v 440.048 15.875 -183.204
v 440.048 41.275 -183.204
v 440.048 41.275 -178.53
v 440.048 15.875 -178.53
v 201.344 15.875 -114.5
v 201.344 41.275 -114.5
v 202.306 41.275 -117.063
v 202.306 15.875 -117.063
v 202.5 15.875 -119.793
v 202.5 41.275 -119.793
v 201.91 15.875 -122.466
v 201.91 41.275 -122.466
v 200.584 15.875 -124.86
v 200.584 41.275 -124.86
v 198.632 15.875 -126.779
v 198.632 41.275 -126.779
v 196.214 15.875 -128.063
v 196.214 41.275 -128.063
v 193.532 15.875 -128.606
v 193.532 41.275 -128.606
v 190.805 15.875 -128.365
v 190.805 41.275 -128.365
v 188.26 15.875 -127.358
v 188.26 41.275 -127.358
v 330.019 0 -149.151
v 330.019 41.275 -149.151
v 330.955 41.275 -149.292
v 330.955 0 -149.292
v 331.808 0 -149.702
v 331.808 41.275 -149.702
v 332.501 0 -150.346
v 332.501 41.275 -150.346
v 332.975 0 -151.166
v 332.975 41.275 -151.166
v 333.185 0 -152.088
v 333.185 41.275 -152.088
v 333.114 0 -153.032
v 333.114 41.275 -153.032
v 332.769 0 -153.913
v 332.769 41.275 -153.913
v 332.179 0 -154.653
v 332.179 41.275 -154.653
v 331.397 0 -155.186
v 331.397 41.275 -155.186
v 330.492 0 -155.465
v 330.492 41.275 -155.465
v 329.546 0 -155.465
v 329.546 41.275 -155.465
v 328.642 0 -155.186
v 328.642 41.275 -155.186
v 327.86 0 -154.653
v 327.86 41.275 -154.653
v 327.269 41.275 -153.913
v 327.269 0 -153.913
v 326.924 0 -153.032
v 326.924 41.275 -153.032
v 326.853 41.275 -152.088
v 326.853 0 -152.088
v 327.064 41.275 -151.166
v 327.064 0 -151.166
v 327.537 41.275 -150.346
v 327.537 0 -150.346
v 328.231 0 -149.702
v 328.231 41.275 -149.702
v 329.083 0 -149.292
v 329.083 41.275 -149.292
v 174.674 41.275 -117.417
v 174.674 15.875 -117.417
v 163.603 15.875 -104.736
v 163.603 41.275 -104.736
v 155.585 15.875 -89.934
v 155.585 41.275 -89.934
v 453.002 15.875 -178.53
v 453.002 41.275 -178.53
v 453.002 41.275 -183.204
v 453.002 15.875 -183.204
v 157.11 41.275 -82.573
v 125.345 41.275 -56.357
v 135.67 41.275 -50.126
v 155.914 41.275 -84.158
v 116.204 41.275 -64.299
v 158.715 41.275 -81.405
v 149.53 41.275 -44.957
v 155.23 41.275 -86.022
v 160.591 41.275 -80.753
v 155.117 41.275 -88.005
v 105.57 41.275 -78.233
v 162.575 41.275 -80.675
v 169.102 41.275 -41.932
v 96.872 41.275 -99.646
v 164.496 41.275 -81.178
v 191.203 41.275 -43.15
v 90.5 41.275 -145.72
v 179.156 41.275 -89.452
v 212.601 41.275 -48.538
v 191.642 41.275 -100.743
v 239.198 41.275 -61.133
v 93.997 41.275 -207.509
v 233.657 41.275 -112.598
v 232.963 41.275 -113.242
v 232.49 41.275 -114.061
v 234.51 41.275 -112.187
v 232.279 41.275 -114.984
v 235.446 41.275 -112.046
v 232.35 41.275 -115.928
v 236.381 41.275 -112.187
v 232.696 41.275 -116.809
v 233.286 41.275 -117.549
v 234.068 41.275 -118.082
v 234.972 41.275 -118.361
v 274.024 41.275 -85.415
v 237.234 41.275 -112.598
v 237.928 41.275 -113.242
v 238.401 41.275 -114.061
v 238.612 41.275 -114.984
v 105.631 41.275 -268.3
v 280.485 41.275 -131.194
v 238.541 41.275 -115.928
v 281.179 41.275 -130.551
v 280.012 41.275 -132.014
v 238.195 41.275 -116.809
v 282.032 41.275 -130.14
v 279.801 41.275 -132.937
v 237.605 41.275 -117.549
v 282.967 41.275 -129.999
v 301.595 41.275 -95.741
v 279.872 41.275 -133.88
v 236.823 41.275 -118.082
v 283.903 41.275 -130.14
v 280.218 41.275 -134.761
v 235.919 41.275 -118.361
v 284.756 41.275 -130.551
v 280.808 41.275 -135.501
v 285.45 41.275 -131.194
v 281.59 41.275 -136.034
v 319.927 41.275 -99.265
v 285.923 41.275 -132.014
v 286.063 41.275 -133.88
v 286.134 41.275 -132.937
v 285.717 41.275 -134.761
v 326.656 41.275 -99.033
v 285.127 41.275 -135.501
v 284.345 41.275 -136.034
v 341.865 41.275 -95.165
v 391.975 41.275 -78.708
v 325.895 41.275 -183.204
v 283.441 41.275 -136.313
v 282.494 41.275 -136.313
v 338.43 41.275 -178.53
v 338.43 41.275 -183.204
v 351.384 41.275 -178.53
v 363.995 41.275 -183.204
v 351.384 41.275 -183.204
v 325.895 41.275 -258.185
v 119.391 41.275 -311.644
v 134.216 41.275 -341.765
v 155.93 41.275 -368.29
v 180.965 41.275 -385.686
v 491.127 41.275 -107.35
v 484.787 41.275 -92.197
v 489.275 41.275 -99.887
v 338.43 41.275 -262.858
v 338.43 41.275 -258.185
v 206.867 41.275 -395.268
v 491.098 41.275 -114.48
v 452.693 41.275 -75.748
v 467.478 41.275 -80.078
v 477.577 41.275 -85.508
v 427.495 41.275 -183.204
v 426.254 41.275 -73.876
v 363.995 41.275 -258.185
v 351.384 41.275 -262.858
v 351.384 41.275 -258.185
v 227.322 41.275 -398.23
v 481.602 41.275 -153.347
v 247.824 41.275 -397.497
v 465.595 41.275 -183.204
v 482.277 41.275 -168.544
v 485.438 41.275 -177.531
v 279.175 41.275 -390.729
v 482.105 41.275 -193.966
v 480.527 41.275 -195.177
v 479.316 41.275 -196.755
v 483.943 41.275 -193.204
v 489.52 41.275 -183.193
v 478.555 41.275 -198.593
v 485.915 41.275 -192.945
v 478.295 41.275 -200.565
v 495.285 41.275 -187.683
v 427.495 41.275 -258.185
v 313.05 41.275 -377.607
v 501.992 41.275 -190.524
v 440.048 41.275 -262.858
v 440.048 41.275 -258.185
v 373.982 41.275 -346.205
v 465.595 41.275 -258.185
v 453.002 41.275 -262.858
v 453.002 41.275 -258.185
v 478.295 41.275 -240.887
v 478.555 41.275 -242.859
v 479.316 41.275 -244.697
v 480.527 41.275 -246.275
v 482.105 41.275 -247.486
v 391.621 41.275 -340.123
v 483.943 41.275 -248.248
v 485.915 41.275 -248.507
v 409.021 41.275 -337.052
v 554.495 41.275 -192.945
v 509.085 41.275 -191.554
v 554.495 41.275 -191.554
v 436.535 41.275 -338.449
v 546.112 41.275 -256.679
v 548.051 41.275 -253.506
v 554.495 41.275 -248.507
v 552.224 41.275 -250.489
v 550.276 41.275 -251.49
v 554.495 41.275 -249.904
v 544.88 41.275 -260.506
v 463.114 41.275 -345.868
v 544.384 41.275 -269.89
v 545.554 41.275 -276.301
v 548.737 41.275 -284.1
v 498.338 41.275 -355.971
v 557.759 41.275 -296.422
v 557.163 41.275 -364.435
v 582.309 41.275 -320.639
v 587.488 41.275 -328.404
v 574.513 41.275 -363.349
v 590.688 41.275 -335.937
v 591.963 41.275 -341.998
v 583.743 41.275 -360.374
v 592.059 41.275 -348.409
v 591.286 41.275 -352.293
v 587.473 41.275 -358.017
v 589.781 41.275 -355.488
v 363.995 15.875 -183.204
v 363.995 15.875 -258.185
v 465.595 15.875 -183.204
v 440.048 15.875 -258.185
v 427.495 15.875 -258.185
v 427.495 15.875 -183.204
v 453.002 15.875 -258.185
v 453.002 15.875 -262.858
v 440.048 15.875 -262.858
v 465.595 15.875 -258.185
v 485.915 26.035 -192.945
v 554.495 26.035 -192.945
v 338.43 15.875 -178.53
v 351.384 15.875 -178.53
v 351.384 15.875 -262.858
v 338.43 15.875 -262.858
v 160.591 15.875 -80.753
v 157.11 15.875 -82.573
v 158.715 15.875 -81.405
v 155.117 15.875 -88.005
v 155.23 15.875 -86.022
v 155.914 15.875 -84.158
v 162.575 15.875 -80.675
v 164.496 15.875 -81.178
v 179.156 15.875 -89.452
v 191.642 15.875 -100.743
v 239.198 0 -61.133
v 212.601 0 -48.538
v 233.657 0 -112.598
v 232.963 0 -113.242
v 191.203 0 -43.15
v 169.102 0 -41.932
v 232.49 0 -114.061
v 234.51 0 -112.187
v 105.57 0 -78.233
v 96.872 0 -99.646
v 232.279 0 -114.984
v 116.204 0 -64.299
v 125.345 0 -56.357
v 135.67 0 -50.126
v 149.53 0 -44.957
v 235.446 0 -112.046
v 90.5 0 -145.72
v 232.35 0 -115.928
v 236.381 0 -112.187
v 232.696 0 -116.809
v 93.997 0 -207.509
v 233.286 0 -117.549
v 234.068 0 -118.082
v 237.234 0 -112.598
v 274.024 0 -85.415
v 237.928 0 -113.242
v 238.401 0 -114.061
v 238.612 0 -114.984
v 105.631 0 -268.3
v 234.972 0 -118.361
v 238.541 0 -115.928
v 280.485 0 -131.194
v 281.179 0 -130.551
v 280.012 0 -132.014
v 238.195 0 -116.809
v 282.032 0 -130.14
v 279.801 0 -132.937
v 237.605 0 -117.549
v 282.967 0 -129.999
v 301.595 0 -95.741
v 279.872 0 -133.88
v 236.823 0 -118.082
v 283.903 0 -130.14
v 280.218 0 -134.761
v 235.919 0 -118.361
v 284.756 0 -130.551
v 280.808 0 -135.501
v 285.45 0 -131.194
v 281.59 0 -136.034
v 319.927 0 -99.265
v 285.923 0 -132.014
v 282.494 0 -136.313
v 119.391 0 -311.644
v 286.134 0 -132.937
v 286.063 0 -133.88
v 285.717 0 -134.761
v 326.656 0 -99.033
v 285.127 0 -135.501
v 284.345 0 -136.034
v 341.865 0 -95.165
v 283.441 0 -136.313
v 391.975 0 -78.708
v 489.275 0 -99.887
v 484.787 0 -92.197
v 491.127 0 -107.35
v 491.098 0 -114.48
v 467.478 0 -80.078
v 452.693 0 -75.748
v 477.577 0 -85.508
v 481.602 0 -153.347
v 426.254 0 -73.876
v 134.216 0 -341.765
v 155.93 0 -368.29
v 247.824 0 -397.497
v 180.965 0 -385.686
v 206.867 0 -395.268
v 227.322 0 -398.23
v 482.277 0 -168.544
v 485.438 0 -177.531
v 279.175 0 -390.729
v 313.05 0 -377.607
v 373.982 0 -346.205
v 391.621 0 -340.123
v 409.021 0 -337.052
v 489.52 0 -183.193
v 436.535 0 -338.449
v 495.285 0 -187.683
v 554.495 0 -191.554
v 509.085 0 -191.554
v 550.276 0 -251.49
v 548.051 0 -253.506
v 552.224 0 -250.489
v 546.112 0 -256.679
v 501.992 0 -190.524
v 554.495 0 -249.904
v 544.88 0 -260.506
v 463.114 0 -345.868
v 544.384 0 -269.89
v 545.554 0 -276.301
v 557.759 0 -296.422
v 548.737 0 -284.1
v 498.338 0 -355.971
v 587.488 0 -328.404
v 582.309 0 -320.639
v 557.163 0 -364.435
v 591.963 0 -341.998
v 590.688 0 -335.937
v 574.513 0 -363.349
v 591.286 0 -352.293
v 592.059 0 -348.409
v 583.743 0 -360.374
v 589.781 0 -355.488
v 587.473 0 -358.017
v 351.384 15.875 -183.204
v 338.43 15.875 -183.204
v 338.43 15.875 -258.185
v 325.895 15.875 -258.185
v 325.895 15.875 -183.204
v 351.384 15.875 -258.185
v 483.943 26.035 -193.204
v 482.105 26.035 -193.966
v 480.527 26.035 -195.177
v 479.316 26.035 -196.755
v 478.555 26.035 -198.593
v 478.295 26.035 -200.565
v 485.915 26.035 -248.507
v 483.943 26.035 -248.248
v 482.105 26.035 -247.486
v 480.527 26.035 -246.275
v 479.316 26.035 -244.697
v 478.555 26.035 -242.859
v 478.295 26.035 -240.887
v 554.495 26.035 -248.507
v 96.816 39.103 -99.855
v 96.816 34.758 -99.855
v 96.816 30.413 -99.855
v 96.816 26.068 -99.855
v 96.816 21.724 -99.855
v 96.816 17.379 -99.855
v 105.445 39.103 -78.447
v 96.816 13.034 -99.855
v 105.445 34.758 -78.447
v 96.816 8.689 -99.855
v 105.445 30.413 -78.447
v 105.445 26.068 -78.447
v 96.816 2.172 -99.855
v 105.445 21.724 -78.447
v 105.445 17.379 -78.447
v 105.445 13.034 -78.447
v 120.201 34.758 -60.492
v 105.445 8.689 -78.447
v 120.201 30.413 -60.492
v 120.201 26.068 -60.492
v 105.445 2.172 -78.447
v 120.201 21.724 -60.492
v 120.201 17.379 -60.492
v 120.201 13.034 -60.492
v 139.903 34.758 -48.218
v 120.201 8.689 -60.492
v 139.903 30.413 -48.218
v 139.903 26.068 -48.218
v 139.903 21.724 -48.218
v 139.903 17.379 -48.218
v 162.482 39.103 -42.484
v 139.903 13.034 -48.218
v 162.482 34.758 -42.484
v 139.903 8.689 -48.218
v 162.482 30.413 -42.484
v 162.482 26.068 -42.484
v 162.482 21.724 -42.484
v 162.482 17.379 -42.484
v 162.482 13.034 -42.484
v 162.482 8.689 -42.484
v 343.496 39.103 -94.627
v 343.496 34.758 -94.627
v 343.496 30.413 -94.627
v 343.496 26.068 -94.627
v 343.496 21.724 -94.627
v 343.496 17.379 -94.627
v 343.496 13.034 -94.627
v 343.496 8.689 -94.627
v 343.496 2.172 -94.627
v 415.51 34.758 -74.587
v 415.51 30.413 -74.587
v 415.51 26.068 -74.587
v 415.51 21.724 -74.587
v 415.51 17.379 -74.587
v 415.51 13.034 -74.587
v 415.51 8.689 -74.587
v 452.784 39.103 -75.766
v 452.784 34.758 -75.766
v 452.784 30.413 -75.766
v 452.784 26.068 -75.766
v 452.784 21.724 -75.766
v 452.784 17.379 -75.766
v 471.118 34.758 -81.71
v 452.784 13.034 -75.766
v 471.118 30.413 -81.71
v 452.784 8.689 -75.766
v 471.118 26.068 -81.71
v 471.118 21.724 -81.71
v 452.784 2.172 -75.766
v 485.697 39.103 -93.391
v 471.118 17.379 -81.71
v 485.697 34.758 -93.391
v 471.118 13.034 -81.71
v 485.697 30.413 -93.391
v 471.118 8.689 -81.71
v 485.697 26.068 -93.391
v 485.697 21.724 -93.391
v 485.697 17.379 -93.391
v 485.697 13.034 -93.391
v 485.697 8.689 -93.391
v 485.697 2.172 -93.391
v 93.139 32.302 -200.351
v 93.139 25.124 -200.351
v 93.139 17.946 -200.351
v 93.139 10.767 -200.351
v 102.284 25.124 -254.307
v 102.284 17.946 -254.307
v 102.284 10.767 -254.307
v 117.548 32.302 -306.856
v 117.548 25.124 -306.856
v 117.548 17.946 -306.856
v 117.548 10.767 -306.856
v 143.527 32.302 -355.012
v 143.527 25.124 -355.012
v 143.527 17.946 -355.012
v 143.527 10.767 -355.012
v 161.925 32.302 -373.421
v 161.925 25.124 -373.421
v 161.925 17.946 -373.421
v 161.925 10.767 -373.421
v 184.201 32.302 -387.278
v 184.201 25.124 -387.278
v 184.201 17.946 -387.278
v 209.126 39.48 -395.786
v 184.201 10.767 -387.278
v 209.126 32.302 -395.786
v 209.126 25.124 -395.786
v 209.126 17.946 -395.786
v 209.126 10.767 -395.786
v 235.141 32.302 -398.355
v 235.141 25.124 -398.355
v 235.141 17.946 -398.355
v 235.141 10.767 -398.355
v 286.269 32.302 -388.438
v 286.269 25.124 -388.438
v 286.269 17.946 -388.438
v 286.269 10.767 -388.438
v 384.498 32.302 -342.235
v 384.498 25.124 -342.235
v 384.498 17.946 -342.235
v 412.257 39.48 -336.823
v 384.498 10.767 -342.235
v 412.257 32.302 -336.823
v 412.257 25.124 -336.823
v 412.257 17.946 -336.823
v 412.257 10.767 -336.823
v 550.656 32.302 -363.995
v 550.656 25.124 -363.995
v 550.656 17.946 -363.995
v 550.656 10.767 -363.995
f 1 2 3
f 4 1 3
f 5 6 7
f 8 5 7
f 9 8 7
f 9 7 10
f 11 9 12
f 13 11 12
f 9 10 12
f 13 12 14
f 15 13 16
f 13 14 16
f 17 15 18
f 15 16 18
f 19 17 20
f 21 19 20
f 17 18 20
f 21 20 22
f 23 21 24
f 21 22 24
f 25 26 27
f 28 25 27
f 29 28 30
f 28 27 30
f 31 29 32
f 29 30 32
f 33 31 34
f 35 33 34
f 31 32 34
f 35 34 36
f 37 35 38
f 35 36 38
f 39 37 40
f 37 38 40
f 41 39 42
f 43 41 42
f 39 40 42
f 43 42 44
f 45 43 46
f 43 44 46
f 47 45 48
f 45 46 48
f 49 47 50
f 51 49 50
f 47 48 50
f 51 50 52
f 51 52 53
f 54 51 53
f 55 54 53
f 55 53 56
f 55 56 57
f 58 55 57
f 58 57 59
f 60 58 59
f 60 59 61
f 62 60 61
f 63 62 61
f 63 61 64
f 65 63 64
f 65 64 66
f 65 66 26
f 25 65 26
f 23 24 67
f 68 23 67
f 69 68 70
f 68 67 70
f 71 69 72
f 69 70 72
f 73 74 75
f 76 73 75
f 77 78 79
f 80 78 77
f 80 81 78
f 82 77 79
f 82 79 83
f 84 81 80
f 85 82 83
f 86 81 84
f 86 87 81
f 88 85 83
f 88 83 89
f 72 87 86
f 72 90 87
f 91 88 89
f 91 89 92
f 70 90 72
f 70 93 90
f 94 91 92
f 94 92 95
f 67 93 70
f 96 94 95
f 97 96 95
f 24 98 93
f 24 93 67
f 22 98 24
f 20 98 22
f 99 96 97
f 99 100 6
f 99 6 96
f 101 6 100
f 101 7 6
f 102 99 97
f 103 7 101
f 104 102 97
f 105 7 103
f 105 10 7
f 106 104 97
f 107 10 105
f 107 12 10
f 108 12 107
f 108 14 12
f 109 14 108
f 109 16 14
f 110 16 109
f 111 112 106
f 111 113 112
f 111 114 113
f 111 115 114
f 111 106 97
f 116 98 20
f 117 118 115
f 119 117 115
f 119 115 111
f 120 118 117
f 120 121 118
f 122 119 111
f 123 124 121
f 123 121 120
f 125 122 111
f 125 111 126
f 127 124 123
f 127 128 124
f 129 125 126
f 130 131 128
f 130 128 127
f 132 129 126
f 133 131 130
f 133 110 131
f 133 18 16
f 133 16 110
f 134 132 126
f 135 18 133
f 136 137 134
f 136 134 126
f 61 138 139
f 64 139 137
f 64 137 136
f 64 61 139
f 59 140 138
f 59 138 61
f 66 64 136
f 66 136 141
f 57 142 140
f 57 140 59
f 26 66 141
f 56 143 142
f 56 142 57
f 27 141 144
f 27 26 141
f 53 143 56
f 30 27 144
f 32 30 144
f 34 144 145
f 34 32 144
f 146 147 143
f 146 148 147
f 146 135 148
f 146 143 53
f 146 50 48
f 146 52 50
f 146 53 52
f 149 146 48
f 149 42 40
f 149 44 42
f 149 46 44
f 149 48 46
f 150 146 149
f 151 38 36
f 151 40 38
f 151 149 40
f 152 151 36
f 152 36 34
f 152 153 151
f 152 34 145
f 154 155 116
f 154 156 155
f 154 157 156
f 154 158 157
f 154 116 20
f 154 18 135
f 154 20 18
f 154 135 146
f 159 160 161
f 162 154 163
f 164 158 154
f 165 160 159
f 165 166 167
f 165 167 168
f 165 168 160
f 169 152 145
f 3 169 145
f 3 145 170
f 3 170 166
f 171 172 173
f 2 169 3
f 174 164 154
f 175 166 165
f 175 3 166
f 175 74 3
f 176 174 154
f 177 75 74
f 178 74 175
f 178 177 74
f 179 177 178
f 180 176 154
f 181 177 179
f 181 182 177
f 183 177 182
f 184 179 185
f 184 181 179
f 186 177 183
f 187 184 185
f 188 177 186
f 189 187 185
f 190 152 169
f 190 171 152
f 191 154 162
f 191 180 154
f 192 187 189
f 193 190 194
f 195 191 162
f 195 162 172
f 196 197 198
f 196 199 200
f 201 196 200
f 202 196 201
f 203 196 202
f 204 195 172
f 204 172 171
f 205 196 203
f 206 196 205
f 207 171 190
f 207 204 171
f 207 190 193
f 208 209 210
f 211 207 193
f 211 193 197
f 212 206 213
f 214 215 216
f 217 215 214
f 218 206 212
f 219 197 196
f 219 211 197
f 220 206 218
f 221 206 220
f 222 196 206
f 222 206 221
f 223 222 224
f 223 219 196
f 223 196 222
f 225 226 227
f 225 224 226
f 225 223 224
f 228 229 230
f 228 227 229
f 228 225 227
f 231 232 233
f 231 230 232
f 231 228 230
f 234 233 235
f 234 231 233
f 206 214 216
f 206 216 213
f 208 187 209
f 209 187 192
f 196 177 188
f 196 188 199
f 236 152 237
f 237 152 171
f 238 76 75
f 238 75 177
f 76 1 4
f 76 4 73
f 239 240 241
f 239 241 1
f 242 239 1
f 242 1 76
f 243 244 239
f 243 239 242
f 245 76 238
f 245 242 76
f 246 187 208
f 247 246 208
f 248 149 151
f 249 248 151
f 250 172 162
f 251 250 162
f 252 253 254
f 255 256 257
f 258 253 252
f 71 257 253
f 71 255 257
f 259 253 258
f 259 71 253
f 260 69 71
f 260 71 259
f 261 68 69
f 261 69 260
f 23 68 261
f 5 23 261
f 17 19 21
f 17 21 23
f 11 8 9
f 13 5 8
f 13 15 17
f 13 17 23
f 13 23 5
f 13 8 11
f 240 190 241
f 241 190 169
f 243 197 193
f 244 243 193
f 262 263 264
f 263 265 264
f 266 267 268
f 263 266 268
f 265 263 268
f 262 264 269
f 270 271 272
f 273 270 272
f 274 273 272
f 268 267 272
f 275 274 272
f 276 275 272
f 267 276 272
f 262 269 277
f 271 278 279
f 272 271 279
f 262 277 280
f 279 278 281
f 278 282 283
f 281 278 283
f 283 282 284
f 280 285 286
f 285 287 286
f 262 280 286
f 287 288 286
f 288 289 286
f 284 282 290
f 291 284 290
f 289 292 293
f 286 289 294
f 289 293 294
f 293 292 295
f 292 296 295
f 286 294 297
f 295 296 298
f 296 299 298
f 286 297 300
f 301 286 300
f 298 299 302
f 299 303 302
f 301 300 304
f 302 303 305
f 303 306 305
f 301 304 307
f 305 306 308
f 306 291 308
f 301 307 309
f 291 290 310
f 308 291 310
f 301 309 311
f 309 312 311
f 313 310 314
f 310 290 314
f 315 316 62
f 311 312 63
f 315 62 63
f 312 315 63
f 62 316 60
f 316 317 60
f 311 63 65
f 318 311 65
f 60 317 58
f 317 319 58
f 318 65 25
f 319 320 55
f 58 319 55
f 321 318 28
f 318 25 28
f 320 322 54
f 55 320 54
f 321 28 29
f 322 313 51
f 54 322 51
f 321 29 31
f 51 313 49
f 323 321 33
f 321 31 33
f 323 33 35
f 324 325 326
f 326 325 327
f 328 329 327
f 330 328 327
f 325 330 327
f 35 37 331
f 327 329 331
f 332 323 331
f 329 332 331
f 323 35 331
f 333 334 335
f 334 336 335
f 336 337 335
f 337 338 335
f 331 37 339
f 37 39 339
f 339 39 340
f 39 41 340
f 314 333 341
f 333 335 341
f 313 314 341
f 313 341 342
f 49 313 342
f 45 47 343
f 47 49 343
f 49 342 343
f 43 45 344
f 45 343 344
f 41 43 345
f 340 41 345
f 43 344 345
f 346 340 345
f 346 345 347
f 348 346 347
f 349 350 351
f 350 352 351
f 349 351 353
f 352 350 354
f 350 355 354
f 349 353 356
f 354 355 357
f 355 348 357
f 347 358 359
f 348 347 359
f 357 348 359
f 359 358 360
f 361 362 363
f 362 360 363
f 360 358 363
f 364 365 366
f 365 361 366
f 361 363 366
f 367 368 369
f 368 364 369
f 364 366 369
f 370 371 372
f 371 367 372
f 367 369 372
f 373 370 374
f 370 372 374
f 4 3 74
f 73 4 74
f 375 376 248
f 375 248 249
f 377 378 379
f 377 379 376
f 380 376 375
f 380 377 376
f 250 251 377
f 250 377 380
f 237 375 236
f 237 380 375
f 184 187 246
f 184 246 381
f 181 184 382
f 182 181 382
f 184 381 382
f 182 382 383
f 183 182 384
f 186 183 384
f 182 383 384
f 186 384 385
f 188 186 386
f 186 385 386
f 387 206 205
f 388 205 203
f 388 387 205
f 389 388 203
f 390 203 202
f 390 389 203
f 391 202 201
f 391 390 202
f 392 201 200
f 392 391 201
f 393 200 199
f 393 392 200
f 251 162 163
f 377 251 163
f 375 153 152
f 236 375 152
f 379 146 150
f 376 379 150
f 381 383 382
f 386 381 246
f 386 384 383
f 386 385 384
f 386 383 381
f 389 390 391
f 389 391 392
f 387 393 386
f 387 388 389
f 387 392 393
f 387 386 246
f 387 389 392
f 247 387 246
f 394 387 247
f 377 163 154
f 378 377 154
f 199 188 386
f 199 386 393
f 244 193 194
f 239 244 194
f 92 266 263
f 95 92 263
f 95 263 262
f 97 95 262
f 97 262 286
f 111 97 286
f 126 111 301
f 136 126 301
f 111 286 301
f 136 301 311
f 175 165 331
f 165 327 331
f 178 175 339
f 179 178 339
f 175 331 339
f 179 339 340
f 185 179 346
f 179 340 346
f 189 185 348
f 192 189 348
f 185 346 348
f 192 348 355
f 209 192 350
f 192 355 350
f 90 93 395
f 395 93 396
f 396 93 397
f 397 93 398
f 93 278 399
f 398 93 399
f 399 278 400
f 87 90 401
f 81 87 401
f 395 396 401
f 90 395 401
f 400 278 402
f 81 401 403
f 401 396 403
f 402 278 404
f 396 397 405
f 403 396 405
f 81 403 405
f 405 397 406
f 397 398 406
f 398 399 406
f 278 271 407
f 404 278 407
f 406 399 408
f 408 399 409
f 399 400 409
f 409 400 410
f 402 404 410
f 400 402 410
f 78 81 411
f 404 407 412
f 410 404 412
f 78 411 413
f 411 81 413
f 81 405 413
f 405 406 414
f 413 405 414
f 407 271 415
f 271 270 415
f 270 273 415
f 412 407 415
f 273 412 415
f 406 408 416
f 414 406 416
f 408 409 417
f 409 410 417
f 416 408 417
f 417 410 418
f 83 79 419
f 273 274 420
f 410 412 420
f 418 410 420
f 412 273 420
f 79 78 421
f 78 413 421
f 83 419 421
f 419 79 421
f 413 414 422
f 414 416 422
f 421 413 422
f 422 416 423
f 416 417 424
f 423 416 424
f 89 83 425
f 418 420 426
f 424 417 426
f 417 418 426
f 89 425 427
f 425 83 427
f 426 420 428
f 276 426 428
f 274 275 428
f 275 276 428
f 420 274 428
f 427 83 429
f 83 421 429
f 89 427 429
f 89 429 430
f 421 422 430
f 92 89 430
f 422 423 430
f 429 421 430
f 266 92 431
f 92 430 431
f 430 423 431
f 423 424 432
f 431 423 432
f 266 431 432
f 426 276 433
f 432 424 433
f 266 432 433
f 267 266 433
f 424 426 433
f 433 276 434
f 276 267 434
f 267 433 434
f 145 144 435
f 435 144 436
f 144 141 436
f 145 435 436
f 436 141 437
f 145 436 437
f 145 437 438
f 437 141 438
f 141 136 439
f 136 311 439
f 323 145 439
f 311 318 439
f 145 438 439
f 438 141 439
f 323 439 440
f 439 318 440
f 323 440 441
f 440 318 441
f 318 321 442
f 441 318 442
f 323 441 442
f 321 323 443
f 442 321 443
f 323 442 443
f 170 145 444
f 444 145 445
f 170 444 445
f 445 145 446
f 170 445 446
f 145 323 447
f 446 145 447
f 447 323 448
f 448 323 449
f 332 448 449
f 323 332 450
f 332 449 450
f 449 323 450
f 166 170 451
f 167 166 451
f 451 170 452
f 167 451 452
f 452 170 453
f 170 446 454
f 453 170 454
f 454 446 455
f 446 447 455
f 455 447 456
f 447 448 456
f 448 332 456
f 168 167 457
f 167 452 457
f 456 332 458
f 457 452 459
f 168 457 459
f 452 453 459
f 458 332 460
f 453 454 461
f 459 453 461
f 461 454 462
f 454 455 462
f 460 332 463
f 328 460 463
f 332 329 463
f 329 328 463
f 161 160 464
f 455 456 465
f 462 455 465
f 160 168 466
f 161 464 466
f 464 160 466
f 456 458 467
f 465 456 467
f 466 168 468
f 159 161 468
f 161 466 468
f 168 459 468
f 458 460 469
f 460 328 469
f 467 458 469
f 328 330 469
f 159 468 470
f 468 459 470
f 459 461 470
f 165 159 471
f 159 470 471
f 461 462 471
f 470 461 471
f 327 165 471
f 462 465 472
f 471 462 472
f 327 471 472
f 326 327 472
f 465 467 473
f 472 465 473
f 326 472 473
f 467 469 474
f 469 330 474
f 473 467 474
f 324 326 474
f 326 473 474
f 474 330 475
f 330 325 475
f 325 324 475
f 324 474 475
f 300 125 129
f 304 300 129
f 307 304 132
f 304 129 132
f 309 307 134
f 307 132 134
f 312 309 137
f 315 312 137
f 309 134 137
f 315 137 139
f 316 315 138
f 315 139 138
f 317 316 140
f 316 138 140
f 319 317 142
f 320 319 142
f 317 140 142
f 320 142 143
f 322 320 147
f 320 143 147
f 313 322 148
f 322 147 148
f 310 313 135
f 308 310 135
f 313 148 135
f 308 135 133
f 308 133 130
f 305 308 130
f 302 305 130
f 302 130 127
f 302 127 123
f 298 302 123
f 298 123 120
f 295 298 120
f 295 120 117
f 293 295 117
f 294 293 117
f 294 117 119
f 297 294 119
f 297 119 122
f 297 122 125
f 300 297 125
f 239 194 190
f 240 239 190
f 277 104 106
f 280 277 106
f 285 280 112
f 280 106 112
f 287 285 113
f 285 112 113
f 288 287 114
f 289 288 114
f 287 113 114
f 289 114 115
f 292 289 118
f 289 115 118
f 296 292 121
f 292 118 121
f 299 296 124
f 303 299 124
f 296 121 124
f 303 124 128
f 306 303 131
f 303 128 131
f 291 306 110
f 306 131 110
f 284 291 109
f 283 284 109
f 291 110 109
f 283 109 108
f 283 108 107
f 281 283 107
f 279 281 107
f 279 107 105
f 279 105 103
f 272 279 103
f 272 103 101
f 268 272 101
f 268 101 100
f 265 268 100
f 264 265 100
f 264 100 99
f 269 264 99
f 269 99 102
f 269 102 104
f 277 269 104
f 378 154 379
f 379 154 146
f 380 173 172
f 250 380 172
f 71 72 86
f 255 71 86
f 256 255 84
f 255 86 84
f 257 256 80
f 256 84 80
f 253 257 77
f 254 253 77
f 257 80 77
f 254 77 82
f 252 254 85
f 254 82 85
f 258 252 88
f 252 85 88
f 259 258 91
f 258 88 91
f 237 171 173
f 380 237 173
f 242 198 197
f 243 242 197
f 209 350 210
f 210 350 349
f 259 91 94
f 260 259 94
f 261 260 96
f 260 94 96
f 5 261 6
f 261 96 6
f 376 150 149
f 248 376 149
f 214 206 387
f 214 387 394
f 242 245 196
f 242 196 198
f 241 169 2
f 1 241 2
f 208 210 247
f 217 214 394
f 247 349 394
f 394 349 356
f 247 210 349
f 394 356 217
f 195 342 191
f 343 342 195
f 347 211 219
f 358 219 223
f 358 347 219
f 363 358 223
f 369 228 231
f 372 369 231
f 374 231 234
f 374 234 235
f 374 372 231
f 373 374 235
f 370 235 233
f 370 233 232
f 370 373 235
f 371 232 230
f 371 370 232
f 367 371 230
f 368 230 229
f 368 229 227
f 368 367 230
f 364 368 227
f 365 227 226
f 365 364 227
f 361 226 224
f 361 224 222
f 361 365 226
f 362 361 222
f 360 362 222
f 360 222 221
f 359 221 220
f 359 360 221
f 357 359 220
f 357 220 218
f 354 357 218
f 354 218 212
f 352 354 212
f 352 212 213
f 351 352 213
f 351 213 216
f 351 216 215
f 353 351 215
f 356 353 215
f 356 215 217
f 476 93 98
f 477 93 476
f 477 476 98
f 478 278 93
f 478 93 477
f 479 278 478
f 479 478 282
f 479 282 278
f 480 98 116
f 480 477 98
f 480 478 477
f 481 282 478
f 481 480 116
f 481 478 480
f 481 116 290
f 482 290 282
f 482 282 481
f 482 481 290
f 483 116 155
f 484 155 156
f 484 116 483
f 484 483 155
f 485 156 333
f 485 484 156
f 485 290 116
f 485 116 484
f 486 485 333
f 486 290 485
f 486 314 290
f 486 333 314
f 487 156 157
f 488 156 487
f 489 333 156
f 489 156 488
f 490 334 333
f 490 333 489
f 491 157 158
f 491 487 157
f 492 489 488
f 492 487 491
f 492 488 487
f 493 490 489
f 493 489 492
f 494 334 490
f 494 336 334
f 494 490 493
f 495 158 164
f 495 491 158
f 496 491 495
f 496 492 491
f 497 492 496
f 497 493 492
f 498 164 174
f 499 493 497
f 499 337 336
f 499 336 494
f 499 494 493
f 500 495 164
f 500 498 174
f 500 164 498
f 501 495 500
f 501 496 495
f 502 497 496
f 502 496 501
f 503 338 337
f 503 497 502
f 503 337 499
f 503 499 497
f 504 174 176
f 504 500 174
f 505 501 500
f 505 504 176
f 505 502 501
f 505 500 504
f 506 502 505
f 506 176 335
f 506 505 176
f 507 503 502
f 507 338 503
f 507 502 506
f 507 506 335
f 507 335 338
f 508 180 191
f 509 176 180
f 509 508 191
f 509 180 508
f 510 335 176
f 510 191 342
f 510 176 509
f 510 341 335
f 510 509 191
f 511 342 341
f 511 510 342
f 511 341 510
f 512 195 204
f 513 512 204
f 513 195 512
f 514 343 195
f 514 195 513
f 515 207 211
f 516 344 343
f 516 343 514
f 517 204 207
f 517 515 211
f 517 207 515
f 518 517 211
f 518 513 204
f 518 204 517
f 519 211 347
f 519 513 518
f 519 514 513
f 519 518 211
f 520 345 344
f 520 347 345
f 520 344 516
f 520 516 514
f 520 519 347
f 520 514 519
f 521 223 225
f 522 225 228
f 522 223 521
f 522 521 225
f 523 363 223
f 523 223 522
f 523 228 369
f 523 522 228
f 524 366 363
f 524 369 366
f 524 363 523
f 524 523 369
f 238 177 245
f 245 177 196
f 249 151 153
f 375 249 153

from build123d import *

# Parameters (mm, degrees)
BOSS_EXTRUDE1_DEPTH = 41.275
SKETCH6_W           = 76.2
SKETCH6_H           = 55.5625
CUT_EXTRUDE4_DEPTH  = 15.24
FILLET5_R           = 7.62
CUT_EXTRUDE6_DEPTH  = 25.4
CUT_EXTRUDE7_DEPTH  = 25.4
SKETCH10_R          = 3.175
CUT_EXTRUDE8_DEPTH  = 76.2


with BuildPart() as part:
    # Sketch2 → Boss-Extrude1 (new body)
    with BuildSketch(Plane(origin=(0, 0, 0), x_dir=(1, 0, 0), z_dir=(0, 1, 0))):
        with BuildLine():
            Line((509.085467797, 191.553525985), (554.494928645, 191.553525985))
            Line((554.494928645, 191.553525985), (554.494928645, 249.904235002))
            add(Edge.make_bspline(
                [(90.500026047, 145.719708809), (89.802029853, 183.371850788), (96.511492218, 236.355913248), (115.870337657, 306.516365252), (135.570664397, 349.324631144), (173.033629511, 385.240749449), (220.6034091, 402.51741798), (279.722097624, 393.299008973), (325.55791088, 372.569597213), (360.608147582, 351.775493279), (386.684398592, 340.659830669), (415.778600245, 334.711262077), (447.167517605, 339.507629156), (478.015579204, 351.745933286), (511.646565599, 358.953142265), (545.972395081, 364.25009995), (573.451291126, 365.275478162), (591.2364529, 357.329515448), (592.850754143, 344.076097244), (589.242521553, 328.849375548), (577.700047901, 314.218770689), (562.451551847, 301.799240171), (550.087476355, 288.203216443), (541.882676348, 269.989405146), (545.59058529, 251.213847843), (554.494928645, 249.904235002)],
                knots=[0, 0, 0, 0, 0.13775138, 0.193404483, 0.266847255, 0.306068759, 0.381118346, 0.441463846, 0.520688543, 0.563923363, 0.590495867, 0.624101664, 0.671189484, 0.704010795, 0.74545192, 0.796656066, 0.8306461, 0.846610089, 0.860786322, 0.874697064, 0.903946738, 0.926062898, 0.947253339, 0.969960817, 1, 1, 1, 1], degree=3))
            add(Edge.make_bspline(
                [(90.500026047, 145.719708809), (92.402722254, 123.486911287), (94.5261105, 85.421488414), (130.636221075, 48.442031825), (169.854108533, 39.277092377), (210.880220395, 45.729353831), (245.227609801, 62.992916981), (272.492474934, 87.208534485), (299.83592433, 95.592945812), (323.874448139, 101.164266259), (342.334928996, 94.989191015), (364.305117352, 87.801201524), (391.505896268, 77.449574411), (425.194489111, 72.740033743), (458.254104424, 75.040646311), (483.562544172, 86.432089871), (492.245066229, 105.918025172), (490.235194897, 124.644247505), (479.574562349, 148.058158908), (481.118471371, 182.615397185), (501.832534703, 191.509682343), (509.085467797, 191.553525985)],
                knots=[0, 0, 0, 0, 0.116243016, 0.176387183, 0.246646035, 0.309540553, 0.382135802, 0.436863479, 0.490014091, 0.524291964, 0.558001643, 0.585151079, 0.641136195, 0.703675246, 0.753688136, 0.808744692, 0.830256544, 0.856511448, 0.899935694, 0.963113053, 1, 1, 1, 1], degree=3))
        make_face()
    extrude(amount=BOSS_EXTRUDE1_DEPTH)

    # Sketch6 → Cut-Extrude4 (cut)
    with BuildSketch(Plane(origin=(0, 41.275, 0), x_dir=(1, 0, 0), z_dir=(0, 1, 0))):
        with Locations((516.394928645, 220.725985002)):
            Rectangle(SKETCH6_W, SKETCH6_H)
    extrude(amount=-CUT_EXTRUDE4_DEPTH, mode=Mode.SUBTRACT)

    # Fillet5
    fillet5_edges = [part.edges().sort_by_distance(p)[0] for p in [
        (478.294928645, 33.655, -192.944735002),
        (478.294928645, 33.655, -248.507235002),
    ]]
    fillet(fillet5_edges, radius=FILLET5_R)

    # Sketch7 → Cut-Extrude6 (cut)
    with BuildSketch(Plane(origin=(0, 41.275, 0), x_dir=(1, 0, 0), z_dir=(0, 1, 0))):
        Polygon((338.430385795, 183.203835002), (338.430385795, 178.530235002), (351.384385795, 178.530235002), (351.384385795, 183.203835002), (363.994928645, 183.203835002), (363.994928645, 258.184635002), (351.384385795, 258.184635002), (351.384385795, 262.858235002), (338.430385795, 262.858235002), (338.430385795, 258.184635002), (325.894928645, 258.184635002), (325.894928645, 183.203835002), align=None)
        Polygon((453.001918211, 258.184635002), (453.001918211, 262.858235002), (440.047918211, 262.858235002), (440.047918211, 258.184635002), (427.494928645, 258.184635002), (427.494928645, 183.203835002), (440.047918211, 183.203835002), (440.047918211, 178.530235002), (453.001918211, 178.530235002), (453.001918211, 183.203835002), (465.594928645, 183.203835002), (465.594928645, 258.184635002), align=None)
    extrude(amount=-CUT_EXTRUDE6_DEPTH, mode=Mode.SUBTRACT)

    # Sketch9 → Cut-Extrude7 (cut)
    with BuildSketch(Plane(origin=(0, 41.275, 0), x_dir=(1, 0, 0), z_dir=(0, 1, 0))):
        with BuildLine():
            ThreePointArc((201.343717425, 114.500240339), (199.677092238, 125.889986979), (188.259993692, 127.357579843))
            ThreePointArc((188.259993692, 127.357579843), (168.787199798, 111.383477208), (155.585468224, 89.93409632))
            ThreePointArc((155.585468224, 89.93409632), (157.109891345, 82.573288652), (164.496182778, 81.177561515))
            ThreePointArc((164.496182778, 81.177561515), (185.711894836, 94.751625715), (201.343717425, 114.500240339))
        make_face()
    extrude(amount=-CUT_EXTRUDE7_DEPTH, mode=Mode.SUBTRACT)

    # Sketch10 → Cut-Extrude8 (cut)
    with BuildSketch(Plane(origin=(0, 41.275, 0), x_dir=(1, 0, 0), z_dir=(0, 1, 0))):
        with Locations(Location((330.01909551, 152.325567708, 0), (0, 0, 270))):
            Circle(SKETCH10_R)
        with Locations(Location((282.967488546, 133.173902452, 0), (0, 0, 270))):
            Circle(SKETCH10_R)
        with Locations(Location((235.445506187, 115.221153561, 0), (0, 0, 270))):
            Circle(SKETCH10_R)
    extrude(amount=-CUT_EXTRUDE8_DEPTH, mode=Mode.SUBTRACT)


solid = part.part
